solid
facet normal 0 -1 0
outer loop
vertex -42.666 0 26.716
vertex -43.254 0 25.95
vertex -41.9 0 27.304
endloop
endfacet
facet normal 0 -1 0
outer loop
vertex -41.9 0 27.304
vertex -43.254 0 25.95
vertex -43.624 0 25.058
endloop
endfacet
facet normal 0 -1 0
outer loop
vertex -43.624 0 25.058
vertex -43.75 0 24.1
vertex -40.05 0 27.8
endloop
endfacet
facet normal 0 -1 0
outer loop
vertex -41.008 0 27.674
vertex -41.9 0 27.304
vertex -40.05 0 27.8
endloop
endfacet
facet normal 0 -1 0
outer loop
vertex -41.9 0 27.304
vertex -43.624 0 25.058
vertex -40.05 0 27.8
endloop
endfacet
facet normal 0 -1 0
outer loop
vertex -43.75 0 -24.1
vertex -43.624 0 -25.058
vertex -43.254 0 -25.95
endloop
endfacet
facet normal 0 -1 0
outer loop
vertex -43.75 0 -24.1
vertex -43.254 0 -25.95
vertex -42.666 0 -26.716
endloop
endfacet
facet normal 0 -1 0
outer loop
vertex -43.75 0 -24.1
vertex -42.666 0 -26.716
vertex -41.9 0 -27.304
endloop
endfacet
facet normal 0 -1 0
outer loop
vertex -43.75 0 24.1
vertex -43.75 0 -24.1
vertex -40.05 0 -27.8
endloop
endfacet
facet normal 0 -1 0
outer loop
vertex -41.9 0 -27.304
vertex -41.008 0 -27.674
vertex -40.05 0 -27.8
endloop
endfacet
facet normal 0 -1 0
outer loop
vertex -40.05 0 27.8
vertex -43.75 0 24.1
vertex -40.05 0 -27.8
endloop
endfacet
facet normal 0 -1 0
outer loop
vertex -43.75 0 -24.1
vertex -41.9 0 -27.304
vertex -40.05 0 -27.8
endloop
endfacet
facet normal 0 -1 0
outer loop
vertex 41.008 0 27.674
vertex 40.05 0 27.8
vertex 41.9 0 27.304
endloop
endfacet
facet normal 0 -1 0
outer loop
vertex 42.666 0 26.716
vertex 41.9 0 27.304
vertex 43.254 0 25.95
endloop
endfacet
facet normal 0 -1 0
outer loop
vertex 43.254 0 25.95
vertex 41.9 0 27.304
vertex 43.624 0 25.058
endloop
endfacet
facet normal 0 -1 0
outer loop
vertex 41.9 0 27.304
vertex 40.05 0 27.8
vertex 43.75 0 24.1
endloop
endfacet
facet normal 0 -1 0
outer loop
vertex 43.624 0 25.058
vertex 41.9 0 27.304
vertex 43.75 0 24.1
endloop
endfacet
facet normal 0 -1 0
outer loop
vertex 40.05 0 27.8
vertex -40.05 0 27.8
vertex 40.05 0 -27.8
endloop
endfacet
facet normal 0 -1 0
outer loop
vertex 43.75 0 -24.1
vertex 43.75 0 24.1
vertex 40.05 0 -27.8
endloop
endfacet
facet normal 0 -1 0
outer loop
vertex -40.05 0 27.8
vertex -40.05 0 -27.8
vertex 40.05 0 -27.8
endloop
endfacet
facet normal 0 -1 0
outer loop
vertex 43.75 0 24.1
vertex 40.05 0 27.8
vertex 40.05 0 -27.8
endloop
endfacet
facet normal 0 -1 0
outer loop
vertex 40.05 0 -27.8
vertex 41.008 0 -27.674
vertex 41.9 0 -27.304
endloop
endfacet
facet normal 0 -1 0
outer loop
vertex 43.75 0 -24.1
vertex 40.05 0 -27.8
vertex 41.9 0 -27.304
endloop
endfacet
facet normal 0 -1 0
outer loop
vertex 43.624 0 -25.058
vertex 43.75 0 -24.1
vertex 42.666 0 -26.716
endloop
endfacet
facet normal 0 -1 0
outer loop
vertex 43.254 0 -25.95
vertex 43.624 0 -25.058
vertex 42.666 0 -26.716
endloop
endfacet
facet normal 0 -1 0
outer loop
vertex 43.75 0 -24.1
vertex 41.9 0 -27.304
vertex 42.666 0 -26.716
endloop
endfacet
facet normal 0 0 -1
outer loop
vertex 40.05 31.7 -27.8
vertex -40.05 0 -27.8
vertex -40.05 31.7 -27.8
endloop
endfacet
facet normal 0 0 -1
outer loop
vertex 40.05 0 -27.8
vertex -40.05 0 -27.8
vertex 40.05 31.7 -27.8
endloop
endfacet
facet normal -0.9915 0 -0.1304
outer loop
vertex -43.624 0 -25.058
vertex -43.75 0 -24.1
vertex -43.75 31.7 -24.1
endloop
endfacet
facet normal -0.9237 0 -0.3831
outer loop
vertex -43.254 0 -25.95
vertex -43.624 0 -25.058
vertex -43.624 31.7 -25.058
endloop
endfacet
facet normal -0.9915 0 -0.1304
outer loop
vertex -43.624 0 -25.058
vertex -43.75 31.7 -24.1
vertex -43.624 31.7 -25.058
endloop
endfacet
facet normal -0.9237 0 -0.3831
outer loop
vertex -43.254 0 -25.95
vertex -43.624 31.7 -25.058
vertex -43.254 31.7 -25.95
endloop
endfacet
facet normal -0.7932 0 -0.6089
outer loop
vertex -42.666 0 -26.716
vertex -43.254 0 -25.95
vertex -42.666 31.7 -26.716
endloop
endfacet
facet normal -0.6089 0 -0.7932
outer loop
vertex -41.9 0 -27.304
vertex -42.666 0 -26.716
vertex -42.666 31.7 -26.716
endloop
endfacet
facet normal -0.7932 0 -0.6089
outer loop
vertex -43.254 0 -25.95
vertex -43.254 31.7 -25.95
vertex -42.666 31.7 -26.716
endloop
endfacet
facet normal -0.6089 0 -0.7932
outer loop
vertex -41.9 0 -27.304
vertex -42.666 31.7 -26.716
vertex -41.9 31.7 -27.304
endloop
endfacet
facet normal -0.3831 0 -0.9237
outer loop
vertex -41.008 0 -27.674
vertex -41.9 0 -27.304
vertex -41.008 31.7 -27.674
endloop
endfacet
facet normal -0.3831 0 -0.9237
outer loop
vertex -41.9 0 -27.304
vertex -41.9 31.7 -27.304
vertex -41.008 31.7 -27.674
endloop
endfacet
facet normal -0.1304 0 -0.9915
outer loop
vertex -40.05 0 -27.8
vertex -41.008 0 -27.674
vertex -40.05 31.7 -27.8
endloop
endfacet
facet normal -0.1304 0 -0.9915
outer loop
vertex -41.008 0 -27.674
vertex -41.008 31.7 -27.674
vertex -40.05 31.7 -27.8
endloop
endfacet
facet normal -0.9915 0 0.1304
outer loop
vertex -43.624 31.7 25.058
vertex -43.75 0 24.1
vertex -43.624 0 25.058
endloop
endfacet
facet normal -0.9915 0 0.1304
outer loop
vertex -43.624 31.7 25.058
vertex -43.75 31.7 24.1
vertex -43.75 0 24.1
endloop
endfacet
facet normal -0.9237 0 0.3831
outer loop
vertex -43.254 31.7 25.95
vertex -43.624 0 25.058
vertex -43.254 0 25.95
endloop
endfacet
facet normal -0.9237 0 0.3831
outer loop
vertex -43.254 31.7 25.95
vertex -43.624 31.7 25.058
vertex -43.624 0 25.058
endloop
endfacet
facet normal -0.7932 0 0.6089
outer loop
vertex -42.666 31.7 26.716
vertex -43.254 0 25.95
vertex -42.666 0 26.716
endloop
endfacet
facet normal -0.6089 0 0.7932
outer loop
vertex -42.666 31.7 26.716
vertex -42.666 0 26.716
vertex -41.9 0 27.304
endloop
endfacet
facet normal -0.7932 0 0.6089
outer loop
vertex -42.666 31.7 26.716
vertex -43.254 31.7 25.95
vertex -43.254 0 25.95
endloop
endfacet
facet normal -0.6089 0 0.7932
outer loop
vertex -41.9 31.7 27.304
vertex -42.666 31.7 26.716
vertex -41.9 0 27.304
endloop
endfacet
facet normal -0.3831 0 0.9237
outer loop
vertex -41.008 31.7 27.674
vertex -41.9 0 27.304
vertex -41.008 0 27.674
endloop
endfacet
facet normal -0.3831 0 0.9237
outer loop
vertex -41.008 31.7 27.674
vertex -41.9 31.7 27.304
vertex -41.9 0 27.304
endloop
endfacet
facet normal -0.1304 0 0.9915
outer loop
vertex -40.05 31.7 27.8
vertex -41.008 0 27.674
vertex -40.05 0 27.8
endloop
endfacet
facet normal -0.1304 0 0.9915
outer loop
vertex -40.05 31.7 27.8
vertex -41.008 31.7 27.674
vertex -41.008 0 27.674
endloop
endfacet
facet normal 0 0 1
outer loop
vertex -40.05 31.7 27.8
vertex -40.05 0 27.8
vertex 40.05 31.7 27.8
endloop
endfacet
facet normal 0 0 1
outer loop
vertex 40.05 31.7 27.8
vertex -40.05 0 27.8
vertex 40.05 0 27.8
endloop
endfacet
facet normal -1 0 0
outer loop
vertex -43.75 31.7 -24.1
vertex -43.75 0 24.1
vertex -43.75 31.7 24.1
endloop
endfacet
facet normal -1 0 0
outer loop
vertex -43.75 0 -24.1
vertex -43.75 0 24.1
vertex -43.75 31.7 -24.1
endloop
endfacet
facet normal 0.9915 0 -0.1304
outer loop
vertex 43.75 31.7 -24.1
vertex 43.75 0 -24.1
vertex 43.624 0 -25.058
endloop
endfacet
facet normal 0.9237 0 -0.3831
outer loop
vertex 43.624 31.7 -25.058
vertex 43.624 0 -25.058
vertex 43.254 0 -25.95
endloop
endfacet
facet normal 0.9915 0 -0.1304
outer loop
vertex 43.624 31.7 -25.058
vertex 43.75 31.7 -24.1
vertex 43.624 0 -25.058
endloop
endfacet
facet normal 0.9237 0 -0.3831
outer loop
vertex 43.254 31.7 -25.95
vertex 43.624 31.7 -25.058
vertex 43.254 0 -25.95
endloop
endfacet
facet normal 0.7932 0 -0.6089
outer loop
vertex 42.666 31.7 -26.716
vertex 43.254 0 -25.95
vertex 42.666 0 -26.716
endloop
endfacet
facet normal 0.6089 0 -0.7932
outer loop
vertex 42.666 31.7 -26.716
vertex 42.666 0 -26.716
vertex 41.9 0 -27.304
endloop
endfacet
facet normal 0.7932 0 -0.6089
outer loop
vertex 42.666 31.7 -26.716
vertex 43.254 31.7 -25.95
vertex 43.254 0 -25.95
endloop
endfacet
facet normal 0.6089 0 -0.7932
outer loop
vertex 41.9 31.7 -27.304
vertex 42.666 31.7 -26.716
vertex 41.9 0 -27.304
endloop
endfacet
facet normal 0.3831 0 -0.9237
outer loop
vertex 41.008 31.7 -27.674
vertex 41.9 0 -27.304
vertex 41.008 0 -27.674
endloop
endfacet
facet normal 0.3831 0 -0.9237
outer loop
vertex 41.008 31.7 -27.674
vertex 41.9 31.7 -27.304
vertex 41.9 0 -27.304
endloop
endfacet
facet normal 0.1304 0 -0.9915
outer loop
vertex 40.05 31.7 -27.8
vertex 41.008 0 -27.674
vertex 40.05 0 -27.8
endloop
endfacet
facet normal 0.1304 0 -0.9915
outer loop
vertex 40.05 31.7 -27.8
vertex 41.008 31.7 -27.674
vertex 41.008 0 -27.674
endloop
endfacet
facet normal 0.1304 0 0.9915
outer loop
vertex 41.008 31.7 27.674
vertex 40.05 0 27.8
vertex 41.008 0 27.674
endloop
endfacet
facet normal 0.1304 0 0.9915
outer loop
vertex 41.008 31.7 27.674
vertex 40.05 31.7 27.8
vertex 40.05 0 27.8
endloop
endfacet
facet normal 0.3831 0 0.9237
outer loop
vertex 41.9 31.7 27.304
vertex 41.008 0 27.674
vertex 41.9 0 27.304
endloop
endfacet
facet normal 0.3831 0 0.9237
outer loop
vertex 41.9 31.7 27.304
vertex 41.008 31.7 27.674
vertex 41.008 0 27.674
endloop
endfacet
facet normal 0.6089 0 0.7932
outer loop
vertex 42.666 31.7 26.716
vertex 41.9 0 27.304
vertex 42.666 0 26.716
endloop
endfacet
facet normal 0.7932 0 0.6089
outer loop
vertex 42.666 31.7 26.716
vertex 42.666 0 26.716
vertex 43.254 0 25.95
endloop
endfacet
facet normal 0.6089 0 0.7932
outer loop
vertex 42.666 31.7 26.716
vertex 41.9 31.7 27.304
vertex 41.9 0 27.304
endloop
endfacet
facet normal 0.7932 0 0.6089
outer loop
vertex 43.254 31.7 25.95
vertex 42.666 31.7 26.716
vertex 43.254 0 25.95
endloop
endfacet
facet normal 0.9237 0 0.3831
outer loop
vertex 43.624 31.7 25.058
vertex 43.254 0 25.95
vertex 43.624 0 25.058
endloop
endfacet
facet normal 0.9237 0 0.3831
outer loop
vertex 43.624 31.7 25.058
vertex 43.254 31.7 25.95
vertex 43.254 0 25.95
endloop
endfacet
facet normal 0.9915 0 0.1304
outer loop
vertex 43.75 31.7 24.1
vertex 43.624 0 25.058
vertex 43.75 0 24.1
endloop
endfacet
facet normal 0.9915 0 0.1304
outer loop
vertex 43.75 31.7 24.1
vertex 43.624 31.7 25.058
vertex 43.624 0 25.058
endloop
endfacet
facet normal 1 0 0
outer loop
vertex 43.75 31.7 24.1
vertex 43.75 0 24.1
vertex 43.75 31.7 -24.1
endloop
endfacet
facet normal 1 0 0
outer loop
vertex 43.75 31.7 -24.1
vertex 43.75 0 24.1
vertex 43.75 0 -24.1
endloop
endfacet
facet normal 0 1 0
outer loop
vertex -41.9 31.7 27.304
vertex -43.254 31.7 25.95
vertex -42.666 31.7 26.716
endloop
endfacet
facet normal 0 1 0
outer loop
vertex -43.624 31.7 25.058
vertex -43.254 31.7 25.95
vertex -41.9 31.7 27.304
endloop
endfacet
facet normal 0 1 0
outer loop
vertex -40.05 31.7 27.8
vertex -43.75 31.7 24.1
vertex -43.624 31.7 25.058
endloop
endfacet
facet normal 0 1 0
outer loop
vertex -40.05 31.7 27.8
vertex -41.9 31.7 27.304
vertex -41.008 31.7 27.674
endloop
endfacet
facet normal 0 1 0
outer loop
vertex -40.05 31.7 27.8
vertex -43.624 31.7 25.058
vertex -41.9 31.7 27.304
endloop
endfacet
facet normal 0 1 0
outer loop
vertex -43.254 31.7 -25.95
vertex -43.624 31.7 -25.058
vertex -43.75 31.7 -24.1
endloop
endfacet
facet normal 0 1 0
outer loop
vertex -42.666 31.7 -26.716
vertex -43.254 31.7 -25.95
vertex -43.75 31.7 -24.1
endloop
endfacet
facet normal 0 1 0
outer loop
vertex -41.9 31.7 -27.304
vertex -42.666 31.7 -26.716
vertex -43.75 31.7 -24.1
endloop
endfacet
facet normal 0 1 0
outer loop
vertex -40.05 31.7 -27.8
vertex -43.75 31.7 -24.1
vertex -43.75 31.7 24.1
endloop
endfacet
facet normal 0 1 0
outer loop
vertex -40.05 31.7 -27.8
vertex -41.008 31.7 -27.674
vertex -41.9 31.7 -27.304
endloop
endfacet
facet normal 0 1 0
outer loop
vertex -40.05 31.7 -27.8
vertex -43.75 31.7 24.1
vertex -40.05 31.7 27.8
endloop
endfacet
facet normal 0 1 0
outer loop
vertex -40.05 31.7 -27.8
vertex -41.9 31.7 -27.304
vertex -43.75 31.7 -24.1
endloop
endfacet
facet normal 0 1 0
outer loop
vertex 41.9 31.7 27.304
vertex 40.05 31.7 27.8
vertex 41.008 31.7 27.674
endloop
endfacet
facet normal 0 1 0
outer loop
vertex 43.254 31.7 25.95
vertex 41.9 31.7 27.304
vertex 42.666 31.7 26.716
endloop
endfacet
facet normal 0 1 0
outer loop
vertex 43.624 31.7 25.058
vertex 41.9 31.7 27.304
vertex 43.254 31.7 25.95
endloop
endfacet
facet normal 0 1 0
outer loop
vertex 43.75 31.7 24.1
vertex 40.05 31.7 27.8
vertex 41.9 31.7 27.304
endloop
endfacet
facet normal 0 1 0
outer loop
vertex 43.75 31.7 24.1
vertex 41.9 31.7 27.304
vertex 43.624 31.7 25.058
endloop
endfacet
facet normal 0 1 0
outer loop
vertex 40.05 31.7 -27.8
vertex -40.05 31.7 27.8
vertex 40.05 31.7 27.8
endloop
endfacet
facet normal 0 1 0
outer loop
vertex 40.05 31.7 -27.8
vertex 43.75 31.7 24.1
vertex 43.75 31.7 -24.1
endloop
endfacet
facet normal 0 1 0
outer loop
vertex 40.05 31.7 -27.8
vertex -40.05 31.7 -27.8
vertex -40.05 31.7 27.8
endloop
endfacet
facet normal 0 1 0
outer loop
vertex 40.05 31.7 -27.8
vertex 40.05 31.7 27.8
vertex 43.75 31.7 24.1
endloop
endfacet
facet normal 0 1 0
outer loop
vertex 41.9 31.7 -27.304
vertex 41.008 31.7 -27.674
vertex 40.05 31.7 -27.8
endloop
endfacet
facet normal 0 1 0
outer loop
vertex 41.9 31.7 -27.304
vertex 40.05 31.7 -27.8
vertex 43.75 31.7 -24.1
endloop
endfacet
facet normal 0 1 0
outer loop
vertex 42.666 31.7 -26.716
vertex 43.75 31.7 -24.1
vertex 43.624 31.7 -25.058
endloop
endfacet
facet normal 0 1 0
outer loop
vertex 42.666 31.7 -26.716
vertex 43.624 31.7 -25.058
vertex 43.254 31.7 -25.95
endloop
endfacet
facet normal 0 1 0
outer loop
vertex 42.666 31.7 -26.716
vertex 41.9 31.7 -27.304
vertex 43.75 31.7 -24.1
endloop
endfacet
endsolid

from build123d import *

# Parameters (mm, degrees)
CROQUIS1_W              = 87.5
CROQUIS1_H              = 55.6
SALIENTE_EXTRUIR1_DEPTH = 31.7
REDONDEO1_R             = 3.7


with BuildPart() as part:
    # Croquis1 → Saliente-Extruir1 (new body)
    with BuildSketch(Plane(origin=(0, 0, 0), x_dir=(1, 0, 0), z_dir=(0, 1, 0))):
        Rectangle(CROQUIS1_W, CROQUIS1_H)
    extrude(amount=SALIENTE_EXTRUIR1_DEPTH)

    # Redondeo1
    redondeo1_edges = [part.edges().sort_by_distance(p)[0] for p in [
        (43.75, 15.85, 27.8),
        (-43.75, 15.85, 27.8),
        (-43.75, 15.85, -27.8),
        (43.75, 15.85, -27.8),
    ]]
    fillet(redondeo1_edges, radius=REDONDEO1_R)


solid = part.part
